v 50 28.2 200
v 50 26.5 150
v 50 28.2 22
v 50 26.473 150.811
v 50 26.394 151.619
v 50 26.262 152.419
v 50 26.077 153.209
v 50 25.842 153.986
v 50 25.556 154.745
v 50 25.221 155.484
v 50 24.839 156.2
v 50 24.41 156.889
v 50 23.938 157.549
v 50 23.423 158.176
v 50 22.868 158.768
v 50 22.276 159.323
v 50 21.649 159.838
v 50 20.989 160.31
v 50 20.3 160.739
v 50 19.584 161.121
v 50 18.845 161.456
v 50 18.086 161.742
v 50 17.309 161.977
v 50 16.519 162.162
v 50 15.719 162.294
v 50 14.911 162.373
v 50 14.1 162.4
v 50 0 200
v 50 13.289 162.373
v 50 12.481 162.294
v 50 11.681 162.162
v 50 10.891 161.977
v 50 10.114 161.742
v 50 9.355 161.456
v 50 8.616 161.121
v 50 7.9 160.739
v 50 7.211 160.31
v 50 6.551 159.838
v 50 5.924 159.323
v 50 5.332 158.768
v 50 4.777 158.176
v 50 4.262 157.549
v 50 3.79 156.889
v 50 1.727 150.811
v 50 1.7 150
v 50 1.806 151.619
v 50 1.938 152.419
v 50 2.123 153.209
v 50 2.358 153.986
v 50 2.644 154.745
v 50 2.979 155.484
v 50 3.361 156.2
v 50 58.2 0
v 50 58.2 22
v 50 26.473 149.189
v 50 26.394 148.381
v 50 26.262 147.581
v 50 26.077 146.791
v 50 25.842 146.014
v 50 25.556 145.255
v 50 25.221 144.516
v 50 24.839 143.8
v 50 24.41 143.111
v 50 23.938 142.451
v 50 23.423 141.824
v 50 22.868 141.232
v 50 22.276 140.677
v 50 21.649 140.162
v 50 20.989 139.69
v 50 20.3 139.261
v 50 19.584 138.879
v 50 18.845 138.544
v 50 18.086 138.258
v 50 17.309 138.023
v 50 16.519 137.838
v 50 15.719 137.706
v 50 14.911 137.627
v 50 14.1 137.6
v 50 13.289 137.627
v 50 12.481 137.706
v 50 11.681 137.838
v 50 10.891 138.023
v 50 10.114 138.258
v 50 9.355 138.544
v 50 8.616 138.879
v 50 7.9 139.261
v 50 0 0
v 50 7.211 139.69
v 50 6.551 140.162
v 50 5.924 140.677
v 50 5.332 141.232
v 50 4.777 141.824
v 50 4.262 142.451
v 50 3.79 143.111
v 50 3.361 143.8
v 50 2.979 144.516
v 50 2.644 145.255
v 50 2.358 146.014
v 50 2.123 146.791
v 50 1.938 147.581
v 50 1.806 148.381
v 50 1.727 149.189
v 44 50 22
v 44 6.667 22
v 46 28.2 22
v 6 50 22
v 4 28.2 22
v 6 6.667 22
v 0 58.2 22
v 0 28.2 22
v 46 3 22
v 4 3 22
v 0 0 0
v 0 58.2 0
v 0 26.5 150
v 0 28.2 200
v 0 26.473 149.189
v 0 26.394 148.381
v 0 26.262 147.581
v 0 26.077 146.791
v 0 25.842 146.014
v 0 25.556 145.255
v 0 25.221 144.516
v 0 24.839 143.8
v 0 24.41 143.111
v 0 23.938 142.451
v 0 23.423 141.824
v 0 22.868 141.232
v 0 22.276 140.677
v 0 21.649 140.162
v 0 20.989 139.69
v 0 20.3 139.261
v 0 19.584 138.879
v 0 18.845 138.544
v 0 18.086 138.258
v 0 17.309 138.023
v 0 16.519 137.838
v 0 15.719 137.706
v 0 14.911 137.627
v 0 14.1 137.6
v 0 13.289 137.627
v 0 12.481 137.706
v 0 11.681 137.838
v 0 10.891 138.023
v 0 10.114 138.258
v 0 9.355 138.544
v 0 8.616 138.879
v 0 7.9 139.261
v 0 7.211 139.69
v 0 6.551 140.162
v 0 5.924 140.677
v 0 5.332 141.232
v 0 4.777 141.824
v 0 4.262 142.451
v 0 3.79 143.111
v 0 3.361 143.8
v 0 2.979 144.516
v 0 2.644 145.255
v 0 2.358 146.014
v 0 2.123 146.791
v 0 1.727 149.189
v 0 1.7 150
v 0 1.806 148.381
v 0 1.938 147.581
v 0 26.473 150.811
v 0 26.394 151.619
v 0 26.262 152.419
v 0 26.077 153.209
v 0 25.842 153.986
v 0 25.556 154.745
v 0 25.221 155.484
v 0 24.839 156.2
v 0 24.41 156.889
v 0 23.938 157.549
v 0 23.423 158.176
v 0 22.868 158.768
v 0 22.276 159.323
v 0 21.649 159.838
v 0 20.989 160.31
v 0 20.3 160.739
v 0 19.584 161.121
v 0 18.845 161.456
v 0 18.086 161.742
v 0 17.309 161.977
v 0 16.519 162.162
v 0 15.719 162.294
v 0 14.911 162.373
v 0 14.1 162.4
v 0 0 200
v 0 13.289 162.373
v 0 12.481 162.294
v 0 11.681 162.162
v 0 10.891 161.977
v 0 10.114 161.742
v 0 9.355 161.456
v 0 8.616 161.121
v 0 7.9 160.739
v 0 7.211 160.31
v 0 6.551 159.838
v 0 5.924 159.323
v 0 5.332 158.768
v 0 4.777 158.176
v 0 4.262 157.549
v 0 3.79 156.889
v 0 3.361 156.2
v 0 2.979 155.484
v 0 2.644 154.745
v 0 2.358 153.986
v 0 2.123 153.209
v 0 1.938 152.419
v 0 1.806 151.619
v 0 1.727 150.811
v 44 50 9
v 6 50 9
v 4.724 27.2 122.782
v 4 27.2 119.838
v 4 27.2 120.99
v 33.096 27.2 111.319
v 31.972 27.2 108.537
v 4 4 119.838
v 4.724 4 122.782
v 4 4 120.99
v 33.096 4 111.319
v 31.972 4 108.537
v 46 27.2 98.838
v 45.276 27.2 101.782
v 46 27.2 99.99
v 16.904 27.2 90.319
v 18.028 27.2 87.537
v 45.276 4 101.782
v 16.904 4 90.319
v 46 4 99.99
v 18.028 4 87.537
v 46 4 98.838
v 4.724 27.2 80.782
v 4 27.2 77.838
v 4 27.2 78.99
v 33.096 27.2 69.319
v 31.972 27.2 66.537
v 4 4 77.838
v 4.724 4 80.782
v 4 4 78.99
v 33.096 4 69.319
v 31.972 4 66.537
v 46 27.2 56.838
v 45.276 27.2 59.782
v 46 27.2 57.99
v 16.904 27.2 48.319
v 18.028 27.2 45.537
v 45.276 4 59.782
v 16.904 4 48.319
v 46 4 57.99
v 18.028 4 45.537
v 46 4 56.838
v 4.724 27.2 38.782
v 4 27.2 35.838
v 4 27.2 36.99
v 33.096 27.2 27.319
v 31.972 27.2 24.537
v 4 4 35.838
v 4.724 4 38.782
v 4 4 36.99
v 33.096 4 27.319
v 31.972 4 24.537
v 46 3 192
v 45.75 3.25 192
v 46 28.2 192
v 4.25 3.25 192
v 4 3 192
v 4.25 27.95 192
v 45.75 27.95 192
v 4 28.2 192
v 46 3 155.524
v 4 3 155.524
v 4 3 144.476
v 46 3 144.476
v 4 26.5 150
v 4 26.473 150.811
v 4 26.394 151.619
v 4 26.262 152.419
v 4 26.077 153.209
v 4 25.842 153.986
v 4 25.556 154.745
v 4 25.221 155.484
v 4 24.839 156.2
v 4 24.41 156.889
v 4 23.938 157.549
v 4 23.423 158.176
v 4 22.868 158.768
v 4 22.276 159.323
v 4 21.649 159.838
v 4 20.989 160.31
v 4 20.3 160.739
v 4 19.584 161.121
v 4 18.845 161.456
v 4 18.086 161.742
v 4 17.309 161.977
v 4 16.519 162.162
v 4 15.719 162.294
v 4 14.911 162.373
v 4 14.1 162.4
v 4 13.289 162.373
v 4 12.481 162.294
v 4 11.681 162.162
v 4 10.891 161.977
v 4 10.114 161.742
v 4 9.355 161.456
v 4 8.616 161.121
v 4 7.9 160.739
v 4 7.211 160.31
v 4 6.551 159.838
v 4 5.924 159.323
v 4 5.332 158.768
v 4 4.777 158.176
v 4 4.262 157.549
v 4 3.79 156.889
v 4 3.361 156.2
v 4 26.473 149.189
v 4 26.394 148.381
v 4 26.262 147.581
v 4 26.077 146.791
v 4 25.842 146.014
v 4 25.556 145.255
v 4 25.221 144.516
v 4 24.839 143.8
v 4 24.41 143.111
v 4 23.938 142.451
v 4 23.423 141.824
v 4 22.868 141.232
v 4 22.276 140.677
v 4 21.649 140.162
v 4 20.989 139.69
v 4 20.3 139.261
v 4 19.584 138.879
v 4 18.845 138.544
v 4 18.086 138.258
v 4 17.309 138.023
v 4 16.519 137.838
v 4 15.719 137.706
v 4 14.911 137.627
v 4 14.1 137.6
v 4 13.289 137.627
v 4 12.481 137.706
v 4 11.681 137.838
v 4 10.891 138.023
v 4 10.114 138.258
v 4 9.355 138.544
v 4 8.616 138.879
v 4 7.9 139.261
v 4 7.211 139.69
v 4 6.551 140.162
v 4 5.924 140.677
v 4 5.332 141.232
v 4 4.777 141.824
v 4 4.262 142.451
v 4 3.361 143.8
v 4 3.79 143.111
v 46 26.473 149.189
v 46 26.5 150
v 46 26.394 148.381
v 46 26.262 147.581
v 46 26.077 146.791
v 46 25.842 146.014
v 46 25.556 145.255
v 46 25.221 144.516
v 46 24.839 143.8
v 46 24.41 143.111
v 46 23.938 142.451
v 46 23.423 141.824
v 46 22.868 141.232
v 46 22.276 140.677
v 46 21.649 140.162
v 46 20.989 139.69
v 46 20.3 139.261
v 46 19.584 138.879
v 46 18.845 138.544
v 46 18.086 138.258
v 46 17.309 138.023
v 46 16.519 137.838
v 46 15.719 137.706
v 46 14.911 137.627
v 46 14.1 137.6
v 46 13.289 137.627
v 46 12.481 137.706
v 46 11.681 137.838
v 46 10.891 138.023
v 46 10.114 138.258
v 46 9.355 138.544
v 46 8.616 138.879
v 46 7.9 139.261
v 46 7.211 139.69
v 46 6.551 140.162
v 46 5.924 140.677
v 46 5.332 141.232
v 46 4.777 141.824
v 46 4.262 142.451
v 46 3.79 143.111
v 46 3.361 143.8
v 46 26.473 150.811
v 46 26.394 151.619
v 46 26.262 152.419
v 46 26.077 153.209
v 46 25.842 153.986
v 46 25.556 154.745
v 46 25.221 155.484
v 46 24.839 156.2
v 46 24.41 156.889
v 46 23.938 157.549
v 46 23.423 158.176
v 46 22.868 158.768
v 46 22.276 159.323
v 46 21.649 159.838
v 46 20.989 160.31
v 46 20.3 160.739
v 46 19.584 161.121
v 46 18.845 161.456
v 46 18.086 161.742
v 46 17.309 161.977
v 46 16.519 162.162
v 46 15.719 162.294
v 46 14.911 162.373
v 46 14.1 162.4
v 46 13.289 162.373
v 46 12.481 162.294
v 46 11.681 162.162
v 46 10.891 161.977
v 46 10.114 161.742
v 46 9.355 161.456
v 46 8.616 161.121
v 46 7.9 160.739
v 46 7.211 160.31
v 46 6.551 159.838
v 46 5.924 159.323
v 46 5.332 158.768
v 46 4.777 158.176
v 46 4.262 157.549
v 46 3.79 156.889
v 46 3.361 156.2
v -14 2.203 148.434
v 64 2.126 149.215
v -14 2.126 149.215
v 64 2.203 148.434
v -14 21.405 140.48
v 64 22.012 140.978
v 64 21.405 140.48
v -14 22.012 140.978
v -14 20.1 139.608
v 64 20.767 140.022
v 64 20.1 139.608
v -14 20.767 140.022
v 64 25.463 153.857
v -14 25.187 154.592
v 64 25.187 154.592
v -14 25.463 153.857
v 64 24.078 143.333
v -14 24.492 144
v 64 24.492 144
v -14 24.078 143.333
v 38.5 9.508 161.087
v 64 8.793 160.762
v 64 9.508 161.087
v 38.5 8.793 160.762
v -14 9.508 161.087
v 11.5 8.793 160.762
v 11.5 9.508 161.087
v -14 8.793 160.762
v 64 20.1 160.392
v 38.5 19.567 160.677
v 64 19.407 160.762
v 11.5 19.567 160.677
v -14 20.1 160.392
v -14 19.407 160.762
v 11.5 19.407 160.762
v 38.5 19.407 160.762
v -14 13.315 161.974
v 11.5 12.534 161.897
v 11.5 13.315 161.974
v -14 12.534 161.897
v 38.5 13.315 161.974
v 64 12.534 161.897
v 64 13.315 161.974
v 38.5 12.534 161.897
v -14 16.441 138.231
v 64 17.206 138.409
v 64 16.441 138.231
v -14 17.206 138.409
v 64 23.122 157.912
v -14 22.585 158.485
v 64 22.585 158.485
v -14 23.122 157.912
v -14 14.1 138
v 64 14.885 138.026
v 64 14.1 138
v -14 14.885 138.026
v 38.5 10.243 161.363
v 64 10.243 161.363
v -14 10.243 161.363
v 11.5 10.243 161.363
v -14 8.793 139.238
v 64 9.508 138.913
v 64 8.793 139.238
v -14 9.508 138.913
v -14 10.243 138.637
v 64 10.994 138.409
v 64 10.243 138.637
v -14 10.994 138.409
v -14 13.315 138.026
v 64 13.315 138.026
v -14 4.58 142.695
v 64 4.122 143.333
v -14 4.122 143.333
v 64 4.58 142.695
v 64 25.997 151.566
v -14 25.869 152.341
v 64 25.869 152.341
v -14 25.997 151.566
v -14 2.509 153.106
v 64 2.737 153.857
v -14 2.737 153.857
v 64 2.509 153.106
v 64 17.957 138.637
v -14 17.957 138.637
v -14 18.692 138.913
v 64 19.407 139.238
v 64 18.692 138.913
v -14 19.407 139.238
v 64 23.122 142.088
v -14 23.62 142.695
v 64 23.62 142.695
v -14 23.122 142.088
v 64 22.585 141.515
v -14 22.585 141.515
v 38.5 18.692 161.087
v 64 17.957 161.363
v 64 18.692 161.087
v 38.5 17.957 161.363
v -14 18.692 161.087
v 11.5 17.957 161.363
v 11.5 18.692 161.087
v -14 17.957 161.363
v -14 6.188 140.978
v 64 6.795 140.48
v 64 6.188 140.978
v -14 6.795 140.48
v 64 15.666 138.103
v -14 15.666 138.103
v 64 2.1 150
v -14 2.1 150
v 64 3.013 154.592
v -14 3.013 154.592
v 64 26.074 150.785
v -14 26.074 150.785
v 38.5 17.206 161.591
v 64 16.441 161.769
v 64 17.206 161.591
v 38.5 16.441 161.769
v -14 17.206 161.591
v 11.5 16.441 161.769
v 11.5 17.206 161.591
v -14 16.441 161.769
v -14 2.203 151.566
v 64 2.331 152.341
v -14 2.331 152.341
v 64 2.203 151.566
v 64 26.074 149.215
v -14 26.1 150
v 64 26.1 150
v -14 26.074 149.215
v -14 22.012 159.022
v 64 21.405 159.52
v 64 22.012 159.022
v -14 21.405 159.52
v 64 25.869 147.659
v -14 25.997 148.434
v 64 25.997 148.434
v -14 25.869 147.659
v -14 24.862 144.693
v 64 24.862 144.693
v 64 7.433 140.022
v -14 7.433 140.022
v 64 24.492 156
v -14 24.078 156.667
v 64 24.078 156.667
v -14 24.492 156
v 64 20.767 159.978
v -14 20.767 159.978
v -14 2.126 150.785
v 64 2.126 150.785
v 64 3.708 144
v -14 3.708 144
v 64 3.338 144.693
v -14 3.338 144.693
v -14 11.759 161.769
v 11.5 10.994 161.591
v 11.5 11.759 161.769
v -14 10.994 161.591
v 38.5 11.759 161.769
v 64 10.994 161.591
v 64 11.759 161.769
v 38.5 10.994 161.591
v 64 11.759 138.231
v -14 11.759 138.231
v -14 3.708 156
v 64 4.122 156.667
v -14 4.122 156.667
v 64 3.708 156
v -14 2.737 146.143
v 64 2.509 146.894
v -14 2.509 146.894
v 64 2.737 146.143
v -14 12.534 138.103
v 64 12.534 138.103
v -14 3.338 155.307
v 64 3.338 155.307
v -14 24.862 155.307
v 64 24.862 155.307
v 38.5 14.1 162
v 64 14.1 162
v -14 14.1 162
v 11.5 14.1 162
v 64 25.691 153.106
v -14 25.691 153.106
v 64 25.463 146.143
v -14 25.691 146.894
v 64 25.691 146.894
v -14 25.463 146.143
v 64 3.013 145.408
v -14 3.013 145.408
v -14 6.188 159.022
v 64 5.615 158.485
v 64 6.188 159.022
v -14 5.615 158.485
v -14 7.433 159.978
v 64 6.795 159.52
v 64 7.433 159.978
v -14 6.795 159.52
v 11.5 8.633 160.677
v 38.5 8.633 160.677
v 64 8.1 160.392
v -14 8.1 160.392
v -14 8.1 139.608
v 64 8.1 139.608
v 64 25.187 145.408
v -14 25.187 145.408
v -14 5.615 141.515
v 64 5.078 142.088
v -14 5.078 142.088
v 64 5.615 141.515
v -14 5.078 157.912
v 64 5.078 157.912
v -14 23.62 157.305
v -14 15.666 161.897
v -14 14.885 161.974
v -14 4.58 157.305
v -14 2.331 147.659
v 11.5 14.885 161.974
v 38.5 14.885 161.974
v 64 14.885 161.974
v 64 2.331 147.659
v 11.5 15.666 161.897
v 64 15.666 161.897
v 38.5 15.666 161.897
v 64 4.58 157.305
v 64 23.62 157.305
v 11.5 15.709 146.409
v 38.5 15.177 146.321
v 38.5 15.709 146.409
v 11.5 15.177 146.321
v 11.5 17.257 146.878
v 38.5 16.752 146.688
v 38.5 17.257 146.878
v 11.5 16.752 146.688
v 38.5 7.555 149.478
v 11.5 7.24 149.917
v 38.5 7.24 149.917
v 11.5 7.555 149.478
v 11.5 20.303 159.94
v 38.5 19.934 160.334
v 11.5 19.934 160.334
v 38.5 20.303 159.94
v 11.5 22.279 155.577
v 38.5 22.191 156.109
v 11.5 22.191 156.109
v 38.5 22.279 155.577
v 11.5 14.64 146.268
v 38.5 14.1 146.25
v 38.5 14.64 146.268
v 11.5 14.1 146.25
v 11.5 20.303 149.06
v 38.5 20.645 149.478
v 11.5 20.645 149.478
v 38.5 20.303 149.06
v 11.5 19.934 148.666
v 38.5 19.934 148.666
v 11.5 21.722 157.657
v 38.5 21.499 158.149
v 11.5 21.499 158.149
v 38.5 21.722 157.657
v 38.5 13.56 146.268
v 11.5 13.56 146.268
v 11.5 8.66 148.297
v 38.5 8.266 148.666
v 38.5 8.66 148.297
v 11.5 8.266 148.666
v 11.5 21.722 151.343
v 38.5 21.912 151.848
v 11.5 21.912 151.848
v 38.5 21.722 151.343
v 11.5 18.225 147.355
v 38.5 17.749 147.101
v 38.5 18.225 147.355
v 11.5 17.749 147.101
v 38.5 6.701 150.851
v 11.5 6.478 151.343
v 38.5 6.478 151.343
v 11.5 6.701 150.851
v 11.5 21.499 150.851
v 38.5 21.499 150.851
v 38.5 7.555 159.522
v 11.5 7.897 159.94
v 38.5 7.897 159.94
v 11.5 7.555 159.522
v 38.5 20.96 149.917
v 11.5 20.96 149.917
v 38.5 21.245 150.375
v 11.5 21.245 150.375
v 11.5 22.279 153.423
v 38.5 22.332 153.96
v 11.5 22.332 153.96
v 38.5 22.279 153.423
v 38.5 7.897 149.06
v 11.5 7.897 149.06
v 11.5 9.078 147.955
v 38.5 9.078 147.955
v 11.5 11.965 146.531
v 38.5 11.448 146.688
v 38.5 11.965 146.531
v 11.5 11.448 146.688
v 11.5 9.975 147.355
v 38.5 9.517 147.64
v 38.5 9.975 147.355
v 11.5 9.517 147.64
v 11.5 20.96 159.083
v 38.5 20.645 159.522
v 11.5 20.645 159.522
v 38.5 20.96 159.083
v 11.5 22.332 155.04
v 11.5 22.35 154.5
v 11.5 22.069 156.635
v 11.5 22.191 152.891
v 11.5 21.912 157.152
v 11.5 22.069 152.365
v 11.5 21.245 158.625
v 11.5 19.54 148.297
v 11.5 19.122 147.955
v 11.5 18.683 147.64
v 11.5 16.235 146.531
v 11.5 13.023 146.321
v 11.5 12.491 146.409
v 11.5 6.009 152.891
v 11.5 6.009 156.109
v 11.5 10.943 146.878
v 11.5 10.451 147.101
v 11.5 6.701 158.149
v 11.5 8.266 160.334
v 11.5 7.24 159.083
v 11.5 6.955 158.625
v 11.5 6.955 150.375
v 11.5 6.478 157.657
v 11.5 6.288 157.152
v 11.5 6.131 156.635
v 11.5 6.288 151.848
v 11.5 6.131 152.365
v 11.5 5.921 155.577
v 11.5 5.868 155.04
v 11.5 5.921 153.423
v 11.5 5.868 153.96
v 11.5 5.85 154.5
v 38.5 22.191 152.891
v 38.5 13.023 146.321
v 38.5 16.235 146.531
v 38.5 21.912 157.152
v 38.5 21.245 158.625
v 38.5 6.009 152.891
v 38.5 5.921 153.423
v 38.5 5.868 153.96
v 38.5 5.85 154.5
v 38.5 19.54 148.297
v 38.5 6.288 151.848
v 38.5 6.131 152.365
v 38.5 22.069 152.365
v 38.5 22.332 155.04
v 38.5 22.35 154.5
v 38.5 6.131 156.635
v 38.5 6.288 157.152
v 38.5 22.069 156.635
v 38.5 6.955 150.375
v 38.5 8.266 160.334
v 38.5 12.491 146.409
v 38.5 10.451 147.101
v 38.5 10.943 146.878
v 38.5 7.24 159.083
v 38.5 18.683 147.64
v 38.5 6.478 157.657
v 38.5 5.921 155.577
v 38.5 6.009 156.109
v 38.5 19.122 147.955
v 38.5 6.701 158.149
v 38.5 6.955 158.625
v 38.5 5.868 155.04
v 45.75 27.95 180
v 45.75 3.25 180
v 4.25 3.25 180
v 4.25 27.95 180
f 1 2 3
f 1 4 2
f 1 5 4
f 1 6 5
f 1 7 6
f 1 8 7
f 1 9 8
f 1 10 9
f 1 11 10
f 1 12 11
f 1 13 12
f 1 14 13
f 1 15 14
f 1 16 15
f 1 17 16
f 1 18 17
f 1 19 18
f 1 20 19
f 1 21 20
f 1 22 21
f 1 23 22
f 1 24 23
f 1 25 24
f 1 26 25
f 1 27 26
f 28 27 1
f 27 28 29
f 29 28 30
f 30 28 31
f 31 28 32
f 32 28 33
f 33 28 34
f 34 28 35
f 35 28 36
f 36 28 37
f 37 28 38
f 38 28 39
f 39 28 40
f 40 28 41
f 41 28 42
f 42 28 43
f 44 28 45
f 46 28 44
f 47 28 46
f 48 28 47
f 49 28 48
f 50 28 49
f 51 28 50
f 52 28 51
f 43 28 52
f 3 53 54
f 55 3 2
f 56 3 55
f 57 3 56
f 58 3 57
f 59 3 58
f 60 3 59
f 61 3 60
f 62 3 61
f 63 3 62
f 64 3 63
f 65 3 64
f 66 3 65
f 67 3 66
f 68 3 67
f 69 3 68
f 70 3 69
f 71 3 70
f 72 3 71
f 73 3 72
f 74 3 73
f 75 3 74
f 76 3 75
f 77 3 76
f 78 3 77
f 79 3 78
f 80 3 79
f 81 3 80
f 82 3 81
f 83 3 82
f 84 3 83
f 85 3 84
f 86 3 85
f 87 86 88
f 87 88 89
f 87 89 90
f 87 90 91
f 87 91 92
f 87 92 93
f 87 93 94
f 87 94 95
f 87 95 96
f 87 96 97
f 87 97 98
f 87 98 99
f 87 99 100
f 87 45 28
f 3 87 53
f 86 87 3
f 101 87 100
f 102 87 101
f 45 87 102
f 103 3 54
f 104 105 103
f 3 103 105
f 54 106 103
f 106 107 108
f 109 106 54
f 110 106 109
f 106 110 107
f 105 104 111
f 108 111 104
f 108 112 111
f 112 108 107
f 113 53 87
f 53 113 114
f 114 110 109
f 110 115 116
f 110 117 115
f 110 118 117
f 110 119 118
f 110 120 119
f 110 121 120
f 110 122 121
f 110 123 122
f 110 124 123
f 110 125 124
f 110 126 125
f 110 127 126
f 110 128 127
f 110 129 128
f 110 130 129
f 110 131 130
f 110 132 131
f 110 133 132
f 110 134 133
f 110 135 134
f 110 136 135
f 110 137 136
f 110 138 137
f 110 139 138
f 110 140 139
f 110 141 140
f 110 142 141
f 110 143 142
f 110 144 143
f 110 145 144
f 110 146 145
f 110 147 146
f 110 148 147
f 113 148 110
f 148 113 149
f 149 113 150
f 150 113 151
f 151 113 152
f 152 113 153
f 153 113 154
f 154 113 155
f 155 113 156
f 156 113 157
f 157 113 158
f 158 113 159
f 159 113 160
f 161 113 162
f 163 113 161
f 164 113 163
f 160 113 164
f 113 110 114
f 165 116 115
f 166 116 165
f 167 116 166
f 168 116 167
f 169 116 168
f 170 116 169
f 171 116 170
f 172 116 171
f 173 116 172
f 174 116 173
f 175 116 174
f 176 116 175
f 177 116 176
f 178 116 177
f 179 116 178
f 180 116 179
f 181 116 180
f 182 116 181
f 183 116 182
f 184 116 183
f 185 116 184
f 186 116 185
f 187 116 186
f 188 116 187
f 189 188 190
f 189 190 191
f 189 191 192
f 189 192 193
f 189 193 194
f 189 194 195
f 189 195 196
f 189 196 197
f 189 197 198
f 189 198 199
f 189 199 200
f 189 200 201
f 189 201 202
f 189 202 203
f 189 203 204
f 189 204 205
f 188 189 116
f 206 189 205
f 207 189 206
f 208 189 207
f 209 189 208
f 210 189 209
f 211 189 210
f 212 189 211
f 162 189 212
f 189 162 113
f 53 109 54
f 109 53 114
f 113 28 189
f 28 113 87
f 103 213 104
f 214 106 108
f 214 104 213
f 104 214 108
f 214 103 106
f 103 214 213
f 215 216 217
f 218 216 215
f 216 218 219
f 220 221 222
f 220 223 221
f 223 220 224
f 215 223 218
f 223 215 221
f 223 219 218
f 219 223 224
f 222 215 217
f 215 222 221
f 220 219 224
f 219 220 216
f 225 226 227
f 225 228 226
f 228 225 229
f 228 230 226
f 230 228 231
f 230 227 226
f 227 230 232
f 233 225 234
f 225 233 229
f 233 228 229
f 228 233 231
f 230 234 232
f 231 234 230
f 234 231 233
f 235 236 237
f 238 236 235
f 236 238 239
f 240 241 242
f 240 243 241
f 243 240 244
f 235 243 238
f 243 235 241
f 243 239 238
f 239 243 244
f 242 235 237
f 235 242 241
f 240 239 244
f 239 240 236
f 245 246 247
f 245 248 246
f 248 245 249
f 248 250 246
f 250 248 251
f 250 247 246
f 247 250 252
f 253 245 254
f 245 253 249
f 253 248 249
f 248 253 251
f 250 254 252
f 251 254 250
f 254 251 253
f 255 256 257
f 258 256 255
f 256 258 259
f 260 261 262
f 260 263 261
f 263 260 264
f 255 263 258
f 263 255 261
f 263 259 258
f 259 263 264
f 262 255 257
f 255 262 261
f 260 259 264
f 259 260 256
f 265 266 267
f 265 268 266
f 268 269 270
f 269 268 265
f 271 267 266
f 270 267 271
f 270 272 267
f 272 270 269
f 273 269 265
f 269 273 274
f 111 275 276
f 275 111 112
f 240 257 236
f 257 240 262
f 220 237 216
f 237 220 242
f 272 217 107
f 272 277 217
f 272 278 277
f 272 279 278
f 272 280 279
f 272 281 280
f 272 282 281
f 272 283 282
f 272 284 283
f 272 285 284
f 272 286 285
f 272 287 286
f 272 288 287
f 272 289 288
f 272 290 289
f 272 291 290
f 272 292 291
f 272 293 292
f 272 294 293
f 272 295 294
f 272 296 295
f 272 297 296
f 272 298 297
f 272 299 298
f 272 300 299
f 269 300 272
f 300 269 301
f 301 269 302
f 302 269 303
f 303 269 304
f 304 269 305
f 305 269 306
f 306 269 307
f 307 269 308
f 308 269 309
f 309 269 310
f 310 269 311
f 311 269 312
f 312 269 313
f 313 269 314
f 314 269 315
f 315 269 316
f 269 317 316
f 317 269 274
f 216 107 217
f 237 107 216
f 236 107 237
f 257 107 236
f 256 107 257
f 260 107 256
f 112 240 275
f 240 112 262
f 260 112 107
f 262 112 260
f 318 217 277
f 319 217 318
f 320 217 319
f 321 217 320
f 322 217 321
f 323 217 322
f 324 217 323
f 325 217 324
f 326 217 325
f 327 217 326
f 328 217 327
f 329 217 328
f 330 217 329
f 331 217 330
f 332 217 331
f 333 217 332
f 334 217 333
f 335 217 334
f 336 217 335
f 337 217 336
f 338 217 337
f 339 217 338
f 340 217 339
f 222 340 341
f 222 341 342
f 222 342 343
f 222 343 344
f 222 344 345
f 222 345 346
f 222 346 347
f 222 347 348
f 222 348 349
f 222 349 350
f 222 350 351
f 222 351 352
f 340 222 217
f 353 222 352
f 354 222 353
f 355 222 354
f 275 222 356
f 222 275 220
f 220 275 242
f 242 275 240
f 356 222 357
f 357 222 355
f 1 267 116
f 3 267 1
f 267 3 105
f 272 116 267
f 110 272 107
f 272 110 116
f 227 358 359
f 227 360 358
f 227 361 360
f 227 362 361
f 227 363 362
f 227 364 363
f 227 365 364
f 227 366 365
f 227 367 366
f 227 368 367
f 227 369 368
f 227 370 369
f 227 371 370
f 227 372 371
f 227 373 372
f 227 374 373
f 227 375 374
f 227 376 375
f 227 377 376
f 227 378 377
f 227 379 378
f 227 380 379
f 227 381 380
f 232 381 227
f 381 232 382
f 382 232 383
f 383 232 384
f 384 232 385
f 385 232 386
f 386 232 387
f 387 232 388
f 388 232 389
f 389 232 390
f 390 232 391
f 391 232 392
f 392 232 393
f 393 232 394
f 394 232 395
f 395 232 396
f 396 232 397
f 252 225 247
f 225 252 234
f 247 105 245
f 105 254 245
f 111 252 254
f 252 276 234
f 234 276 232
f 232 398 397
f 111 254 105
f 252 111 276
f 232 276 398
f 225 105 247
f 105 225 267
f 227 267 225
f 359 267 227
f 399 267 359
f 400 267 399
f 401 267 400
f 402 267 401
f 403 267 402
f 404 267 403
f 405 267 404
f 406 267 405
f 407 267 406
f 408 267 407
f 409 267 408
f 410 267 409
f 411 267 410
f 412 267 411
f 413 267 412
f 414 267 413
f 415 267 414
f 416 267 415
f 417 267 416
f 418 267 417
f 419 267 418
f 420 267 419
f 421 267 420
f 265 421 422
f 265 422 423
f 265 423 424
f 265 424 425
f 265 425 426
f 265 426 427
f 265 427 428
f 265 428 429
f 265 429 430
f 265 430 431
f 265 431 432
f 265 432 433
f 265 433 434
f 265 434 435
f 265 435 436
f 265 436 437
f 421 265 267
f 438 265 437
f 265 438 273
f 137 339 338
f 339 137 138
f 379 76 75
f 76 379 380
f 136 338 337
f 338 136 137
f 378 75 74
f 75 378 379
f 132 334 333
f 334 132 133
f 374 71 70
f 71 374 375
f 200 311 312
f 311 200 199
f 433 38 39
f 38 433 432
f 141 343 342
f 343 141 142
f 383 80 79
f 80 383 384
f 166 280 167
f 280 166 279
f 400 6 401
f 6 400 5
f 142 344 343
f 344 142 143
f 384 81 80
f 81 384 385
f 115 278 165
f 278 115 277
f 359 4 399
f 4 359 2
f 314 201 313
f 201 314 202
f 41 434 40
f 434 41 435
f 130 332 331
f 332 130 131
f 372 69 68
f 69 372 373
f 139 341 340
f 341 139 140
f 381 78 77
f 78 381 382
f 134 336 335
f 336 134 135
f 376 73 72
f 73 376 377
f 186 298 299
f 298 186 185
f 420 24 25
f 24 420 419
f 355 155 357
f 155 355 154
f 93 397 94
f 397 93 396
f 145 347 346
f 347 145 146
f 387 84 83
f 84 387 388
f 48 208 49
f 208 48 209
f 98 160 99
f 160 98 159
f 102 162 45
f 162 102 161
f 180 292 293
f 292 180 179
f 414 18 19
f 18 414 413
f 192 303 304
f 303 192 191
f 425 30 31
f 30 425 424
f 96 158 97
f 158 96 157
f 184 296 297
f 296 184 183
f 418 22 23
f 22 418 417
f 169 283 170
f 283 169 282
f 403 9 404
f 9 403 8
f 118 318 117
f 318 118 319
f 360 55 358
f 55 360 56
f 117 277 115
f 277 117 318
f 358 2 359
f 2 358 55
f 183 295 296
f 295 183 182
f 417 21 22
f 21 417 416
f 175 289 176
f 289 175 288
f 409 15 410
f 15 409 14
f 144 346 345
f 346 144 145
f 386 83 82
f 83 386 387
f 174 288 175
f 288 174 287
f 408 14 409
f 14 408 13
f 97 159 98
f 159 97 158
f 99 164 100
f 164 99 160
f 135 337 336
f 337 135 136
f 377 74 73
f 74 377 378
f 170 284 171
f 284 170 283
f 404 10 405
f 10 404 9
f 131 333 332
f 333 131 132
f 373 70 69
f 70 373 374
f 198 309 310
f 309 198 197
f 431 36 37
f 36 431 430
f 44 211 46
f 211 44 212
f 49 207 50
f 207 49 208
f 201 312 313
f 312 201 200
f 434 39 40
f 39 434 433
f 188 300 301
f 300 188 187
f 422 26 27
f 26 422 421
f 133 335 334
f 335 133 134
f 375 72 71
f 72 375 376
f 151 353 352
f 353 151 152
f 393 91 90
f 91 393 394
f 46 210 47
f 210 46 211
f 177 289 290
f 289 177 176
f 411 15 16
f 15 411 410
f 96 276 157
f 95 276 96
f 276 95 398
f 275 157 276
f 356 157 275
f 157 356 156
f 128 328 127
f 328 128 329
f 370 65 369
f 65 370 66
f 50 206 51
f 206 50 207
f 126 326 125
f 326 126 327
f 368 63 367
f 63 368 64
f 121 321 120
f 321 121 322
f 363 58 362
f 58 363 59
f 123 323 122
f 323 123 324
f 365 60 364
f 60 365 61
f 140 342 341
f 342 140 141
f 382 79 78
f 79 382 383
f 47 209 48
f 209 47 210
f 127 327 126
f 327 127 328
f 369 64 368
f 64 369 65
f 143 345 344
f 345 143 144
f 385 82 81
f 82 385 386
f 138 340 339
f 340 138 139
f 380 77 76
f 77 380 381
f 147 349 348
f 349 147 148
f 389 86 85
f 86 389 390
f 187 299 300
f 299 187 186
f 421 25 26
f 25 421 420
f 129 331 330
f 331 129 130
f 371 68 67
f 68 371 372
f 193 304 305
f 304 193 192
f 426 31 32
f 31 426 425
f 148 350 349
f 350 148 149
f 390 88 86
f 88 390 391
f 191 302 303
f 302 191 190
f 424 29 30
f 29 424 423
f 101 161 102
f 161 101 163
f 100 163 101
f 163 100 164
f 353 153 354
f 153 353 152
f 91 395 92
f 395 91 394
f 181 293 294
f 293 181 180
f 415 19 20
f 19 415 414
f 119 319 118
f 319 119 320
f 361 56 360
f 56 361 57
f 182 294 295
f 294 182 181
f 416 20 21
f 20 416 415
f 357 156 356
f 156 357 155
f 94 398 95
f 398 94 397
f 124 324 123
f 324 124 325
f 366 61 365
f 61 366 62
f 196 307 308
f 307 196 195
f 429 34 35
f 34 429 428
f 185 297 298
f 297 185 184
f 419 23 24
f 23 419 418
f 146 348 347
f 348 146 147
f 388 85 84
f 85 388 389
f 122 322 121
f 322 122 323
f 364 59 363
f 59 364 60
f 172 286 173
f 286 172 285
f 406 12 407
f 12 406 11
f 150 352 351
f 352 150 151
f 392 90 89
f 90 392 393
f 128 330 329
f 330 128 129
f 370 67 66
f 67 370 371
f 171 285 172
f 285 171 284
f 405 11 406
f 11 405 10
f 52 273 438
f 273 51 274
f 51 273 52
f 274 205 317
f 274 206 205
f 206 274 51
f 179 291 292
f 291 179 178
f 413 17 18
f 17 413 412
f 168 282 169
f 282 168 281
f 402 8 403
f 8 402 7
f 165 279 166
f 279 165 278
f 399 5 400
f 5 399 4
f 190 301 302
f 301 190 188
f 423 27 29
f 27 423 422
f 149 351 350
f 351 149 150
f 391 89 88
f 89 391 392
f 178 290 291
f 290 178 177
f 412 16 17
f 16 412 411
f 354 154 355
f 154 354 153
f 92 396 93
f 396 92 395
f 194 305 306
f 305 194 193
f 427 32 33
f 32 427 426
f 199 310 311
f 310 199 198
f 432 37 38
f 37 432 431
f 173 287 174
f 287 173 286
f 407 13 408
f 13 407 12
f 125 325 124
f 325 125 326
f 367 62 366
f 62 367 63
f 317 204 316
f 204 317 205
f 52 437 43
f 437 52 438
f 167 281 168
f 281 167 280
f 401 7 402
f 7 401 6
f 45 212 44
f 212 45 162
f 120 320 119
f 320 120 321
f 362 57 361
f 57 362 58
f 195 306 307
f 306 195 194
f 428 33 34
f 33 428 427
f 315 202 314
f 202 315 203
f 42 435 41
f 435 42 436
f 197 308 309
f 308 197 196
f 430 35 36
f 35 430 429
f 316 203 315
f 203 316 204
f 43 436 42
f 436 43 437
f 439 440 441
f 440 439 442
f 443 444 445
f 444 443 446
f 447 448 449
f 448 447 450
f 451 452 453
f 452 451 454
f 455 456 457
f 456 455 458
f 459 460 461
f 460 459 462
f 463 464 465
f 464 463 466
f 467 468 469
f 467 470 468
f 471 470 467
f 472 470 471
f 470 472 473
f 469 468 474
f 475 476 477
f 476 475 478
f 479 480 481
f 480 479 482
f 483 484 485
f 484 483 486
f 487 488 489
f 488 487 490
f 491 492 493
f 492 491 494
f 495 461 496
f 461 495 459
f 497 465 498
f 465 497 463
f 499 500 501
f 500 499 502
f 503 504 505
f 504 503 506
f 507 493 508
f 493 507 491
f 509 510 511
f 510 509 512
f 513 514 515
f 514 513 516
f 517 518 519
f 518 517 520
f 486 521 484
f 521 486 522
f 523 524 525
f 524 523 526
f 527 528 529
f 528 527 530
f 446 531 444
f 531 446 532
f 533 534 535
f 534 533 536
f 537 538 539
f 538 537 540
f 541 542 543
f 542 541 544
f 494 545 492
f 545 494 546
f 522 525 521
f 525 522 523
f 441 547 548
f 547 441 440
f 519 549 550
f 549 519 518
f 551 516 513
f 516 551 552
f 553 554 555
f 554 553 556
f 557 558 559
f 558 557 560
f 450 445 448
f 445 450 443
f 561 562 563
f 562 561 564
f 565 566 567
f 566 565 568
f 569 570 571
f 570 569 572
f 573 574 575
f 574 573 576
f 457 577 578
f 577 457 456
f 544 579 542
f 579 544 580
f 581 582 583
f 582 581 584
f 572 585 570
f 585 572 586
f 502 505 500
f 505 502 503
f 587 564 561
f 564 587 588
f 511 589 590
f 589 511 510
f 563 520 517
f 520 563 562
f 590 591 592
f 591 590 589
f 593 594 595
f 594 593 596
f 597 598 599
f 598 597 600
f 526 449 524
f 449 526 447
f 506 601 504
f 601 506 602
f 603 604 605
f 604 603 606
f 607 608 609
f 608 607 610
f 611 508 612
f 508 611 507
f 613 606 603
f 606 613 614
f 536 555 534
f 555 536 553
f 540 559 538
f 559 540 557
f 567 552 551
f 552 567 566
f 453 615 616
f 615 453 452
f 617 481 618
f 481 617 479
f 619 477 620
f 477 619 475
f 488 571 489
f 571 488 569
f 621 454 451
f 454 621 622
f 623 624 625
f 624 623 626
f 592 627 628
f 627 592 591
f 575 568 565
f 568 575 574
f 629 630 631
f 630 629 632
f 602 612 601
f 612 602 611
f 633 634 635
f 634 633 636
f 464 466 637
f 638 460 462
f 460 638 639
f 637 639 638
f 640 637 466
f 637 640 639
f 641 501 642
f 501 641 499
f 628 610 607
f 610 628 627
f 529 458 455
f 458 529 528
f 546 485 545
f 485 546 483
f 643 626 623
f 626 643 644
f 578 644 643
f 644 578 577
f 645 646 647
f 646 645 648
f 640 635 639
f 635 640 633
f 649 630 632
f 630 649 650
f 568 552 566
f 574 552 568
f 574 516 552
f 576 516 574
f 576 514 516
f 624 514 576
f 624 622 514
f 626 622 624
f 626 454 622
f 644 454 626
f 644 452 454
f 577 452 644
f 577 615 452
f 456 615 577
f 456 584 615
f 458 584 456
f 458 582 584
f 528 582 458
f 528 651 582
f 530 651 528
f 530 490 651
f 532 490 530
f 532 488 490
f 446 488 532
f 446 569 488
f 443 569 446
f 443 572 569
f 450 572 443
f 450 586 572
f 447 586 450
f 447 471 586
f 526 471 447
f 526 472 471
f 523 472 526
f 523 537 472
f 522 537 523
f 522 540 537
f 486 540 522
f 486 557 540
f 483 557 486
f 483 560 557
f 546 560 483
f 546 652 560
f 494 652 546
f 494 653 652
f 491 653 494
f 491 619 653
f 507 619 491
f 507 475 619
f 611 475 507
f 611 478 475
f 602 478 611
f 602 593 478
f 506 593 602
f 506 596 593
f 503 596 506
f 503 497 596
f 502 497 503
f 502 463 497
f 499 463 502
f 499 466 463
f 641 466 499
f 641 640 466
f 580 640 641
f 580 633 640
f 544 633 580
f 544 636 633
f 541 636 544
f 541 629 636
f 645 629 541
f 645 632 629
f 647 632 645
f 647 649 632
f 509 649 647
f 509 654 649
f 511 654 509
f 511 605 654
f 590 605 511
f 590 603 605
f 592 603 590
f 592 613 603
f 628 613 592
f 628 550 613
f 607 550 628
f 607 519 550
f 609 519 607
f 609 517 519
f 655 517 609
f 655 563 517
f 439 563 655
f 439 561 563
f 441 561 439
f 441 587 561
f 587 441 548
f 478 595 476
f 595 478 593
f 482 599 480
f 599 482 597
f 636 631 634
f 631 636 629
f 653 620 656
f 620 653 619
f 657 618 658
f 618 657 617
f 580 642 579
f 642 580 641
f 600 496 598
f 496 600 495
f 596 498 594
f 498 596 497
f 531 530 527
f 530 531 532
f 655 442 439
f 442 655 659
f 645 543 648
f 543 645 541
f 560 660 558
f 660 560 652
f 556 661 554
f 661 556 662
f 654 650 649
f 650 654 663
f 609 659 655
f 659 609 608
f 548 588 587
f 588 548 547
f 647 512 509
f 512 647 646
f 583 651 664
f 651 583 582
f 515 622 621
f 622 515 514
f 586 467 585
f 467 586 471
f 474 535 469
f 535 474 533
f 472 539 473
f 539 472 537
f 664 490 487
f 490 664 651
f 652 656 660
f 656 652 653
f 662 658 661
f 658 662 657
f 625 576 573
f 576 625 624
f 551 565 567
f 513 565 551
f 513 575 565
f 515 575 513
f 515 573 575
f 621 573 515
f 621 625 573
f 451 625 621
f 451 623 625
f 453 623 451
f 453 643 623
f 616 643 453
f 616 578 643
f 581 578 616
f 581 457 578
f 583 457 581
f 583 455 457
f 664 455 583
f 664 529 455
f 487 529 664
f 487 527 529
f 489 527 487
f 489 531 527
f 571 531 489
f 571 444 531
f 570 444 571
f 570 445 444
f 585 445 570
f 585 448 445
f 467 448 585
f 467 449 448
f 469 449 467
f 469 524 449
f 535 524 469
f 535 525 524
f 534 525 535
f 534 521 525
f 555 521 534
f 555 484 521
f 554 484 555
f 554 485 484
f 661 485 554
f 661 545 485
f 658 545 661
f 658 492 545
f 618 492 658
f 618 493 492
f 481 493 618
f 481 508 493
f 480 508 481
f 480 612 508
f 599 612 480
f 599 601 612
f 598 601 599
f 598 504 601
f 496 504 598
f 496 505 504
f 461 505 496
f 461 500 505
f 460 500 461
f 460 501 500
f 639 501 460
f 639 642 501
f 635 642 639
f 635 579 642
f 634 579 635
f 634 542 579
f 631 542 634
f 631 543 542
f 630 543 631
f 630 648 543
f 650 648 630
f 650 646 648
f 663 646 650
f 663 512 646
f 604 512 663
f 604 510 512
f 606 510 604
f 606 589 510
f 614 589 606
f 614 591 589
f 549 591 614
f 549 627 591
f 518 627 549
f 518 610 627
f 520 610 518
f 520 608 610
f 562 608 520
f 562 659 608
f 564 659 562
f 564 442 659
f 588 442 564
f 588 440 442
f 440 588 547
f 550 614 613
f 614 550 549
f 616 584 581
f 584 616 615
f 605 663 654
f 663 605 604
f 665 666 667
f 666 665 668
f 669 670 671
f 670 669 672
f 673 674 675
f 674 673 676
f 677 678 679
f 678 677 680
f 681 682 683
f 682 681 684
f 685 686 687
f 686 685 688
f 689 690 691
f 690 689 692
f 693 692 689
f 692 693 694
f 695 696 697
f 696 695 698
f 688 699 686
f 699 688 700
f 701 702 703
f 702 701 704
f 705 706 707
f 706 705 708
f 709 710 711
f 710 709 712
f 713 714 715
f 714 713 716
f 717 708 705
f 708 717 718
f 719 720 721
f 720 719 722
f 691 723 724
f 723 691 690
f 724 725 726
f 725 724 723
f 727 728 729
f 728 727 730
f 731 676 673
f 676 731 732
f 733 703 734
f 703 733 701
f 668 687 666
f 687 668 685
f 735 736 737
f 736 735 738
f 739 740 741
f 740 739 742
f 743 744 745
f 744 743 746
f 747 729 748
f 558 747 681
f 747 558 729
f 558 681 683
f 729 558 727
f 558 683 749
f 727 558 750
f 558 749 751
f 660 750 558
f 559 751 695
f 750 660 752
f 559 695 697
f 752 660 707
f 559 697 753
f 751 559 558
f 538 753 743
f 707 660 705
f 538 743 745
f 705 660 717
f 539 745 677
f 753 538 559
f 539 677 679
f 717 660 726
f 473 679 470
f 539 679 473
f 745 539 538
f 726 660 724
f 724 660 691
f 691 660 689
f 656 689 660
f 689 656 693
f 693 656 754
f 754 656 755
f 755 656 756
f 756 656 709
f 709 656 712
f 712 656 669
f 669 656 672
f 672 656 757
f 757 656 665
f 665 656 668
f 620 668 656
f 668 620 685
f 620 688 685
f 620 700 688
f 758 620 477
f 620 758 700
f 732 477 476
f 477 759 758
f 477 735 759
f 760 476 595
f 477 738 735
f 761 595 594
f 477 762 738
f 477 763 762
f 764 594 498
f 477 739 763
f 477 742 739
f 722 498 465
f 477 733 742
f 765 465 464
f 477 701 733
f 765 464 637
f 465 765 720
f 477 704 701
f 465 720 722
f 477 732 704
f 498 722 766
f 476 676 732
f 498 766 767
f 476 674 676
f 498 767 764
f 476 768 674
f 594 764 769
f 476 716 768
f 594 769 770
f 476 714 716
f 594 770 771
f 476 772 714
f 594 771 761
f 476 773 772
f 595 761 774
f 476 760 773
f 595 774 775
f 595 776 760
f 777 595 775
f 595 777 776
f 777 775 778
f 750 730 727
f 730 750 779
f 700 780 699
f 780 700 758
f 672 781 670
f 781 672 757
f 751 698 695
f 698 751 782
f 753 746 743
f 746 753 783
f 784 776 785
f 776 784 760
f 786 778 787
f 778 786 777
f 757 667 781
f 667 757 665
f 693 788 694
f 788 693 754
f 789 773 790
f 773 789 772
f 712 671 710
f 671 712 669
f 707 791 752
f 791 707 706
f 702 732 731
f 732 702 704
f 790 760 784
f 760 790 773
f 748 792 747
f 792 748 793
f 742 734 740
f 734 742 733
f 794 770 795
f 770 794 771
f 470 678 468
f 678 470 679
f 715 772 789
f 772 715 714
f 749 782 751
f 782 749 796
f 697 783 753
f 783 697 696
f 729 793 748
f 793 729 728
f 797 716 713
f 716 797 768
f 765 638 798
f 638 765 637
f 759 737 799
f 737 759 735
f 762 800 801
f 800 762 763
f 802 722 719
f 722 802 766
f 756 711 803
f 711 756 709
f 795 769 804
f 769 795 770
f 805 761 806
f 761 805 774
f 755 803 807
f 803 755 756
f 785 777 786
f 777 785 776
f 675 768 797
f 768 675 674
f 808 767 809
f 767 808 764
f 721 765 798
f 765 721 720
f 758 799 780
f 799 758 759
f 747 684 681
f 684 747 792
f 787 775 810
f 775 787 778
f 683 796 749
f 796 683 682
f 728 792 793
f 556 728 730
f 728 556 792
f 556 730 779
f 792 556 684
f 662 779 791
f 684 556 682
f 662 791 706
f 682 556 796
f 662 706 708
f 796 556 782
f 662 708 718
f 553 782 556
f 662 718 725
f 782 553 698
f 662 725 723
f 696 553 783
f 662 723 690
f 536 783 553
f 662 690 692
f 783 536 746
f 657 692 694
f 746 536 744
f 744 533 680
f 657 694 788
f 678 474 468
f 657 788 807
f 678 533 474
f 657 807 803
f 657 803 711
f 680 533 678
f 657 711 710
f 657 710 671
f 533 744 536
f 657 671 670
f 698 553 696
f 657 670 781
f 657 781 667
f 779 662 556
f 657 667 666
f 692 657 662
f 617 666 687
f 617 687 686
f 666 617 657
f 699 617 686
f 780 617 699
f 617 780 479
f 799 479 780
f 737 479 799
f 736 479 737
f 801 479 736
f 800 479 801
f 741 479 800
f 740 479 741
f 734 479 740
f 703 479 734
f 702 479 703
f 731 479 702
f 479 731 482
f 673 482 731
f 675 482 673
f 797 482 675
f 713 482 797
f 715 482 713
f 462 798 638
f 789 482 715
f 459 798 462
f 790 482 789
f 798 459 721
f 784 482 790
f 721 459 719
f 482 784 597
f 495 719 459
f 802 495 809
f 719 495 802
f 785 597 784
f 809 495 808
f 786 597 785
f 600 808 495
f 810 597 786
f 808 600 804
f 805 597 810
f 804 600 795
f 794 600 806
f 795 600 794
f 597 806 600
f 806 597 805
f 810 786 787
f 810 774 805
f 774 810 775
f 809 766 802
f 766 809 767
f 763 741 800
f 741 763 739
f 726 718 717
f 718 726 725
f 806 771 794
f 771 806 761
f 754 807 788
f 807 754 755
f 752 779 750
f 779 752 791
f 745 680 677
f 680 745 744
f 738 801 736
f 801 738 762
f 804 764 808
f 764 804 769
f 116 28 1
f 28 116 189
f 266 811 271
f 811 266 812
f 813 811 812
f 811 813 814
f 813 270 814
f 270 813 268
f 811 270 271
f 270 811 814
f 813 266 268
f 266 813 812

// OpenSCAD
$fn = 96;

// Toggle the default view.
show_assembly = true;
show_print_layout = false;
show_base_only = false;
show_body_only = false;
show_cover_only = false;
show_roller_only = false;

// Candy and printer assumptions.
candy_d = 15;
fit_clearance = 0.25;          // Friction-fit clearance per side for the cover plug.
rotating_clearance = 0.40;     // Radial running clearance around the roller.

// Overall envelope.
overall_w = 50;
overall_h = 200;

// Major parts.
base_t = 22;
cover_t = 8;
body_h = overall_h - base_t - cover_t;

// Body.
side_t = 4;
back_t = 3;
front_glue_land = 0;
body_w = overall_w;
roller_d = 24;
roller_r = roller_d / 2;
roller_gap_wall = 0.60;        // Gap from roller OD to back wall / future acrylic.
channel_d = roller_d + 2 * roller_gap_wall;
body_d = back_t + channel_d + front_glue_land;
inner_w = body_w - 2 * side_t;
acrylic_plane_y = body_d;

// Roller and scoop.
roller_handle_extension = 14;
roller_len = body_w + 2 * roller_handle_extension;
roller_hole_d = roller_d + 2 * rotating_clearance;
scoop_d = 16.5;
scoop_len = inner_w - 15.0;
scoop_center_lift = 4.5;       // Offsets the scoop upward to avoid a paper-thin shell.

// Vertical placement.
body_z = base_t;
roller_z = 150;
roller_y = body_d / 2;

// Slides.
slide_count = 5;
slide_t = 3;
slide_depth = channel_d - 2.0;
slide_margin = 8;
slide_length_scale = 0.9;
slide_run = (inner_w - slide_margin) * slide_length_scale;
slide_angle = 22;
slide_drop = slide_run * sin(slide_angle);
roller_to_slide_gap = 15;
slide_step_z = 21;
top_slide_high_z = (roller_z - roller_r - body_z) - roller_to_slide_gap - slide_t;
slide_anchor_z = [for (i = [0 : slide_count - 1]) top_slide_high_z - i * slide_step_z];

// Fifth slide discharge point. The last slide is the left slide, so candy exits near the right side.
last_slide_end_x = (side_t - 0.4) + slide_run * cos(slide_angle);

// Base.
base_front_margin = 30;
base_d = body_d + base_front_margin;
trough_w = overall_w - 2 * side_t - 4;
trough_l = 50;
trough_point_z = base_t - 15;
trough_x = (overall_w - trough_w) / 2;

// Cover plug.
cover_plug_h = 12;
cover_plug_w = inner_w - 2 * fit_clearance;
cover_plug_d = channel_d - 2 * fit_clearance;

module trough_prism_origin() {
    // Maps local polygon/extrude axes [u, v, w] to global [x, y, z] = [w, u, v].
    // That gives an X-axis prism from a Y-Z triangle.
    multmatrix([
        [0, 0, 1, 0],
        [1, 0, 0, 0],
        [0, 1, 0, 0],
        [0, 0, 0, 1]
    ])
        linear_extrude(height = trough_w)
        polygon(points = [
            [0, trough_point_z],
            [0, base_t],
            [trough_l, base_t]
        ]);
}

module base_plate() {
    color([0.96, 0.64, 0.05])
    difference() {
        cube([overall_w, base_d, base_t]);
        translate([trough_x, 0, 2])
            translate([trough_w / 2, trough_l / 2, (trough_point_z + base_t) / 2])
            rotate([180, 180, 0])
            translate([-trough_w / 2, -trough_l / 2, -(trough_point_z + base_t) / 2])
            trough_prism_origin();
    }
}

module cover_plate() {
    color([0.96, 0.64, 0.05])
    union() {
        cube([overall_w, body_d, cover_t]);

        // One-piece friction plug. 0.20 mm per side is a sane FDM starting point.
        translate([(overall_w - cover_plug_w) / 2,
                   back_t + fit_clearance,
                   -cover_plug_h])
            cube([cover_plug_w, cover_plug_d, cover_plug_h]);
    }
}

module left_slide(anchor_z) {
    translate([side_t - 0.4, back_t + 1.0, anchor_z])
        rotate([0, slide_angle, 0])
        cube([slide_run, slide_depth, slide_t]);
}

module right_slide(anchor_z) {
    translate([body_w - side_t + 0.4, back_t + 1.0, anchor_z])
        rotate([0, -slide_angle, 0])
        translate([-slide_run, 0, 0])
        cube([slide_run, slide_depth, slide_t]);
}

module body_part() {
    color([0.74, 0.74, 0.76])
    difference() {
        union() {
            cube([body_w, back_t, body_h]);
            cube([side_t, body_d, body_h]);
            translate([body_w - side_t, 0, 0])
                cube([side_t, body_d, body_h]);

            for (i = [0 : slide_count - 1]) {
                if (i % 2 == 0) {
                    left_slide(slide_anchor_z[i]);
                } else {
                    right_slide(slide_anchor_z[i]);
                }
            }
        }

        // Circular through-holes that the roller snaps into.
        translate([-1, roller_y, roller_z - body_z])
            rotate([0, 90, 0])
            cylinder(d = roller_hole_d, h = body_w + 2, center = false);
    }
}

module roller_part() {
    color([0.95, 0.68, 0.08])
    difference() {
        rotate([0, 90, 0])
            cylinder(d = roller_d, h = roller_len, center = true);

        // Single scoop sized for one 15 mm candy.
        translate([0, 0, scoop_center_lift])
            rotate([0, 90, 0])
            cylinder(d = scoop_d, h = scoop_len, center = true);
    }
}

module assembly_view() {
    translate([0, 0, 0])
        base_plate();

    translate([0, 0, body_z])
        body_part();

    translate([body_w / 2, roller_y, roller_z])
        roller_part();

    translate([0, 0, overall_h - cover_t])
        cover_plate();
}

module print_layout_view(spacing = 10) {
    // Base
    translate([0, 0, 0])
        base_plate();

    // Body printed on the back wall.
    translate([overall_w + spacing, 0, 0])
        rotate([90, 0, 0])
        body_part();

    // Cover
    translate([overall_w + body_h + 2 * spacing, 0, 0])
        cover_plate();

    // Roller
    translate([overall_w + body_h + overall_w + 3 * spacing, roller_r + 2, 0])
        rotate([90, 0, 0])
        roller_part();
}

if (show_base_only) {
    base_plate();
} else if (show_body_only) {
    body_part();
} else if (show_cover_only) {
    cover_plate();
} else if (show_roller_only) {
    roller_part();
} else if (show_assembly) {
    assembly_view();
} else if (show_print_layout) {
    print_layout_view();
}
